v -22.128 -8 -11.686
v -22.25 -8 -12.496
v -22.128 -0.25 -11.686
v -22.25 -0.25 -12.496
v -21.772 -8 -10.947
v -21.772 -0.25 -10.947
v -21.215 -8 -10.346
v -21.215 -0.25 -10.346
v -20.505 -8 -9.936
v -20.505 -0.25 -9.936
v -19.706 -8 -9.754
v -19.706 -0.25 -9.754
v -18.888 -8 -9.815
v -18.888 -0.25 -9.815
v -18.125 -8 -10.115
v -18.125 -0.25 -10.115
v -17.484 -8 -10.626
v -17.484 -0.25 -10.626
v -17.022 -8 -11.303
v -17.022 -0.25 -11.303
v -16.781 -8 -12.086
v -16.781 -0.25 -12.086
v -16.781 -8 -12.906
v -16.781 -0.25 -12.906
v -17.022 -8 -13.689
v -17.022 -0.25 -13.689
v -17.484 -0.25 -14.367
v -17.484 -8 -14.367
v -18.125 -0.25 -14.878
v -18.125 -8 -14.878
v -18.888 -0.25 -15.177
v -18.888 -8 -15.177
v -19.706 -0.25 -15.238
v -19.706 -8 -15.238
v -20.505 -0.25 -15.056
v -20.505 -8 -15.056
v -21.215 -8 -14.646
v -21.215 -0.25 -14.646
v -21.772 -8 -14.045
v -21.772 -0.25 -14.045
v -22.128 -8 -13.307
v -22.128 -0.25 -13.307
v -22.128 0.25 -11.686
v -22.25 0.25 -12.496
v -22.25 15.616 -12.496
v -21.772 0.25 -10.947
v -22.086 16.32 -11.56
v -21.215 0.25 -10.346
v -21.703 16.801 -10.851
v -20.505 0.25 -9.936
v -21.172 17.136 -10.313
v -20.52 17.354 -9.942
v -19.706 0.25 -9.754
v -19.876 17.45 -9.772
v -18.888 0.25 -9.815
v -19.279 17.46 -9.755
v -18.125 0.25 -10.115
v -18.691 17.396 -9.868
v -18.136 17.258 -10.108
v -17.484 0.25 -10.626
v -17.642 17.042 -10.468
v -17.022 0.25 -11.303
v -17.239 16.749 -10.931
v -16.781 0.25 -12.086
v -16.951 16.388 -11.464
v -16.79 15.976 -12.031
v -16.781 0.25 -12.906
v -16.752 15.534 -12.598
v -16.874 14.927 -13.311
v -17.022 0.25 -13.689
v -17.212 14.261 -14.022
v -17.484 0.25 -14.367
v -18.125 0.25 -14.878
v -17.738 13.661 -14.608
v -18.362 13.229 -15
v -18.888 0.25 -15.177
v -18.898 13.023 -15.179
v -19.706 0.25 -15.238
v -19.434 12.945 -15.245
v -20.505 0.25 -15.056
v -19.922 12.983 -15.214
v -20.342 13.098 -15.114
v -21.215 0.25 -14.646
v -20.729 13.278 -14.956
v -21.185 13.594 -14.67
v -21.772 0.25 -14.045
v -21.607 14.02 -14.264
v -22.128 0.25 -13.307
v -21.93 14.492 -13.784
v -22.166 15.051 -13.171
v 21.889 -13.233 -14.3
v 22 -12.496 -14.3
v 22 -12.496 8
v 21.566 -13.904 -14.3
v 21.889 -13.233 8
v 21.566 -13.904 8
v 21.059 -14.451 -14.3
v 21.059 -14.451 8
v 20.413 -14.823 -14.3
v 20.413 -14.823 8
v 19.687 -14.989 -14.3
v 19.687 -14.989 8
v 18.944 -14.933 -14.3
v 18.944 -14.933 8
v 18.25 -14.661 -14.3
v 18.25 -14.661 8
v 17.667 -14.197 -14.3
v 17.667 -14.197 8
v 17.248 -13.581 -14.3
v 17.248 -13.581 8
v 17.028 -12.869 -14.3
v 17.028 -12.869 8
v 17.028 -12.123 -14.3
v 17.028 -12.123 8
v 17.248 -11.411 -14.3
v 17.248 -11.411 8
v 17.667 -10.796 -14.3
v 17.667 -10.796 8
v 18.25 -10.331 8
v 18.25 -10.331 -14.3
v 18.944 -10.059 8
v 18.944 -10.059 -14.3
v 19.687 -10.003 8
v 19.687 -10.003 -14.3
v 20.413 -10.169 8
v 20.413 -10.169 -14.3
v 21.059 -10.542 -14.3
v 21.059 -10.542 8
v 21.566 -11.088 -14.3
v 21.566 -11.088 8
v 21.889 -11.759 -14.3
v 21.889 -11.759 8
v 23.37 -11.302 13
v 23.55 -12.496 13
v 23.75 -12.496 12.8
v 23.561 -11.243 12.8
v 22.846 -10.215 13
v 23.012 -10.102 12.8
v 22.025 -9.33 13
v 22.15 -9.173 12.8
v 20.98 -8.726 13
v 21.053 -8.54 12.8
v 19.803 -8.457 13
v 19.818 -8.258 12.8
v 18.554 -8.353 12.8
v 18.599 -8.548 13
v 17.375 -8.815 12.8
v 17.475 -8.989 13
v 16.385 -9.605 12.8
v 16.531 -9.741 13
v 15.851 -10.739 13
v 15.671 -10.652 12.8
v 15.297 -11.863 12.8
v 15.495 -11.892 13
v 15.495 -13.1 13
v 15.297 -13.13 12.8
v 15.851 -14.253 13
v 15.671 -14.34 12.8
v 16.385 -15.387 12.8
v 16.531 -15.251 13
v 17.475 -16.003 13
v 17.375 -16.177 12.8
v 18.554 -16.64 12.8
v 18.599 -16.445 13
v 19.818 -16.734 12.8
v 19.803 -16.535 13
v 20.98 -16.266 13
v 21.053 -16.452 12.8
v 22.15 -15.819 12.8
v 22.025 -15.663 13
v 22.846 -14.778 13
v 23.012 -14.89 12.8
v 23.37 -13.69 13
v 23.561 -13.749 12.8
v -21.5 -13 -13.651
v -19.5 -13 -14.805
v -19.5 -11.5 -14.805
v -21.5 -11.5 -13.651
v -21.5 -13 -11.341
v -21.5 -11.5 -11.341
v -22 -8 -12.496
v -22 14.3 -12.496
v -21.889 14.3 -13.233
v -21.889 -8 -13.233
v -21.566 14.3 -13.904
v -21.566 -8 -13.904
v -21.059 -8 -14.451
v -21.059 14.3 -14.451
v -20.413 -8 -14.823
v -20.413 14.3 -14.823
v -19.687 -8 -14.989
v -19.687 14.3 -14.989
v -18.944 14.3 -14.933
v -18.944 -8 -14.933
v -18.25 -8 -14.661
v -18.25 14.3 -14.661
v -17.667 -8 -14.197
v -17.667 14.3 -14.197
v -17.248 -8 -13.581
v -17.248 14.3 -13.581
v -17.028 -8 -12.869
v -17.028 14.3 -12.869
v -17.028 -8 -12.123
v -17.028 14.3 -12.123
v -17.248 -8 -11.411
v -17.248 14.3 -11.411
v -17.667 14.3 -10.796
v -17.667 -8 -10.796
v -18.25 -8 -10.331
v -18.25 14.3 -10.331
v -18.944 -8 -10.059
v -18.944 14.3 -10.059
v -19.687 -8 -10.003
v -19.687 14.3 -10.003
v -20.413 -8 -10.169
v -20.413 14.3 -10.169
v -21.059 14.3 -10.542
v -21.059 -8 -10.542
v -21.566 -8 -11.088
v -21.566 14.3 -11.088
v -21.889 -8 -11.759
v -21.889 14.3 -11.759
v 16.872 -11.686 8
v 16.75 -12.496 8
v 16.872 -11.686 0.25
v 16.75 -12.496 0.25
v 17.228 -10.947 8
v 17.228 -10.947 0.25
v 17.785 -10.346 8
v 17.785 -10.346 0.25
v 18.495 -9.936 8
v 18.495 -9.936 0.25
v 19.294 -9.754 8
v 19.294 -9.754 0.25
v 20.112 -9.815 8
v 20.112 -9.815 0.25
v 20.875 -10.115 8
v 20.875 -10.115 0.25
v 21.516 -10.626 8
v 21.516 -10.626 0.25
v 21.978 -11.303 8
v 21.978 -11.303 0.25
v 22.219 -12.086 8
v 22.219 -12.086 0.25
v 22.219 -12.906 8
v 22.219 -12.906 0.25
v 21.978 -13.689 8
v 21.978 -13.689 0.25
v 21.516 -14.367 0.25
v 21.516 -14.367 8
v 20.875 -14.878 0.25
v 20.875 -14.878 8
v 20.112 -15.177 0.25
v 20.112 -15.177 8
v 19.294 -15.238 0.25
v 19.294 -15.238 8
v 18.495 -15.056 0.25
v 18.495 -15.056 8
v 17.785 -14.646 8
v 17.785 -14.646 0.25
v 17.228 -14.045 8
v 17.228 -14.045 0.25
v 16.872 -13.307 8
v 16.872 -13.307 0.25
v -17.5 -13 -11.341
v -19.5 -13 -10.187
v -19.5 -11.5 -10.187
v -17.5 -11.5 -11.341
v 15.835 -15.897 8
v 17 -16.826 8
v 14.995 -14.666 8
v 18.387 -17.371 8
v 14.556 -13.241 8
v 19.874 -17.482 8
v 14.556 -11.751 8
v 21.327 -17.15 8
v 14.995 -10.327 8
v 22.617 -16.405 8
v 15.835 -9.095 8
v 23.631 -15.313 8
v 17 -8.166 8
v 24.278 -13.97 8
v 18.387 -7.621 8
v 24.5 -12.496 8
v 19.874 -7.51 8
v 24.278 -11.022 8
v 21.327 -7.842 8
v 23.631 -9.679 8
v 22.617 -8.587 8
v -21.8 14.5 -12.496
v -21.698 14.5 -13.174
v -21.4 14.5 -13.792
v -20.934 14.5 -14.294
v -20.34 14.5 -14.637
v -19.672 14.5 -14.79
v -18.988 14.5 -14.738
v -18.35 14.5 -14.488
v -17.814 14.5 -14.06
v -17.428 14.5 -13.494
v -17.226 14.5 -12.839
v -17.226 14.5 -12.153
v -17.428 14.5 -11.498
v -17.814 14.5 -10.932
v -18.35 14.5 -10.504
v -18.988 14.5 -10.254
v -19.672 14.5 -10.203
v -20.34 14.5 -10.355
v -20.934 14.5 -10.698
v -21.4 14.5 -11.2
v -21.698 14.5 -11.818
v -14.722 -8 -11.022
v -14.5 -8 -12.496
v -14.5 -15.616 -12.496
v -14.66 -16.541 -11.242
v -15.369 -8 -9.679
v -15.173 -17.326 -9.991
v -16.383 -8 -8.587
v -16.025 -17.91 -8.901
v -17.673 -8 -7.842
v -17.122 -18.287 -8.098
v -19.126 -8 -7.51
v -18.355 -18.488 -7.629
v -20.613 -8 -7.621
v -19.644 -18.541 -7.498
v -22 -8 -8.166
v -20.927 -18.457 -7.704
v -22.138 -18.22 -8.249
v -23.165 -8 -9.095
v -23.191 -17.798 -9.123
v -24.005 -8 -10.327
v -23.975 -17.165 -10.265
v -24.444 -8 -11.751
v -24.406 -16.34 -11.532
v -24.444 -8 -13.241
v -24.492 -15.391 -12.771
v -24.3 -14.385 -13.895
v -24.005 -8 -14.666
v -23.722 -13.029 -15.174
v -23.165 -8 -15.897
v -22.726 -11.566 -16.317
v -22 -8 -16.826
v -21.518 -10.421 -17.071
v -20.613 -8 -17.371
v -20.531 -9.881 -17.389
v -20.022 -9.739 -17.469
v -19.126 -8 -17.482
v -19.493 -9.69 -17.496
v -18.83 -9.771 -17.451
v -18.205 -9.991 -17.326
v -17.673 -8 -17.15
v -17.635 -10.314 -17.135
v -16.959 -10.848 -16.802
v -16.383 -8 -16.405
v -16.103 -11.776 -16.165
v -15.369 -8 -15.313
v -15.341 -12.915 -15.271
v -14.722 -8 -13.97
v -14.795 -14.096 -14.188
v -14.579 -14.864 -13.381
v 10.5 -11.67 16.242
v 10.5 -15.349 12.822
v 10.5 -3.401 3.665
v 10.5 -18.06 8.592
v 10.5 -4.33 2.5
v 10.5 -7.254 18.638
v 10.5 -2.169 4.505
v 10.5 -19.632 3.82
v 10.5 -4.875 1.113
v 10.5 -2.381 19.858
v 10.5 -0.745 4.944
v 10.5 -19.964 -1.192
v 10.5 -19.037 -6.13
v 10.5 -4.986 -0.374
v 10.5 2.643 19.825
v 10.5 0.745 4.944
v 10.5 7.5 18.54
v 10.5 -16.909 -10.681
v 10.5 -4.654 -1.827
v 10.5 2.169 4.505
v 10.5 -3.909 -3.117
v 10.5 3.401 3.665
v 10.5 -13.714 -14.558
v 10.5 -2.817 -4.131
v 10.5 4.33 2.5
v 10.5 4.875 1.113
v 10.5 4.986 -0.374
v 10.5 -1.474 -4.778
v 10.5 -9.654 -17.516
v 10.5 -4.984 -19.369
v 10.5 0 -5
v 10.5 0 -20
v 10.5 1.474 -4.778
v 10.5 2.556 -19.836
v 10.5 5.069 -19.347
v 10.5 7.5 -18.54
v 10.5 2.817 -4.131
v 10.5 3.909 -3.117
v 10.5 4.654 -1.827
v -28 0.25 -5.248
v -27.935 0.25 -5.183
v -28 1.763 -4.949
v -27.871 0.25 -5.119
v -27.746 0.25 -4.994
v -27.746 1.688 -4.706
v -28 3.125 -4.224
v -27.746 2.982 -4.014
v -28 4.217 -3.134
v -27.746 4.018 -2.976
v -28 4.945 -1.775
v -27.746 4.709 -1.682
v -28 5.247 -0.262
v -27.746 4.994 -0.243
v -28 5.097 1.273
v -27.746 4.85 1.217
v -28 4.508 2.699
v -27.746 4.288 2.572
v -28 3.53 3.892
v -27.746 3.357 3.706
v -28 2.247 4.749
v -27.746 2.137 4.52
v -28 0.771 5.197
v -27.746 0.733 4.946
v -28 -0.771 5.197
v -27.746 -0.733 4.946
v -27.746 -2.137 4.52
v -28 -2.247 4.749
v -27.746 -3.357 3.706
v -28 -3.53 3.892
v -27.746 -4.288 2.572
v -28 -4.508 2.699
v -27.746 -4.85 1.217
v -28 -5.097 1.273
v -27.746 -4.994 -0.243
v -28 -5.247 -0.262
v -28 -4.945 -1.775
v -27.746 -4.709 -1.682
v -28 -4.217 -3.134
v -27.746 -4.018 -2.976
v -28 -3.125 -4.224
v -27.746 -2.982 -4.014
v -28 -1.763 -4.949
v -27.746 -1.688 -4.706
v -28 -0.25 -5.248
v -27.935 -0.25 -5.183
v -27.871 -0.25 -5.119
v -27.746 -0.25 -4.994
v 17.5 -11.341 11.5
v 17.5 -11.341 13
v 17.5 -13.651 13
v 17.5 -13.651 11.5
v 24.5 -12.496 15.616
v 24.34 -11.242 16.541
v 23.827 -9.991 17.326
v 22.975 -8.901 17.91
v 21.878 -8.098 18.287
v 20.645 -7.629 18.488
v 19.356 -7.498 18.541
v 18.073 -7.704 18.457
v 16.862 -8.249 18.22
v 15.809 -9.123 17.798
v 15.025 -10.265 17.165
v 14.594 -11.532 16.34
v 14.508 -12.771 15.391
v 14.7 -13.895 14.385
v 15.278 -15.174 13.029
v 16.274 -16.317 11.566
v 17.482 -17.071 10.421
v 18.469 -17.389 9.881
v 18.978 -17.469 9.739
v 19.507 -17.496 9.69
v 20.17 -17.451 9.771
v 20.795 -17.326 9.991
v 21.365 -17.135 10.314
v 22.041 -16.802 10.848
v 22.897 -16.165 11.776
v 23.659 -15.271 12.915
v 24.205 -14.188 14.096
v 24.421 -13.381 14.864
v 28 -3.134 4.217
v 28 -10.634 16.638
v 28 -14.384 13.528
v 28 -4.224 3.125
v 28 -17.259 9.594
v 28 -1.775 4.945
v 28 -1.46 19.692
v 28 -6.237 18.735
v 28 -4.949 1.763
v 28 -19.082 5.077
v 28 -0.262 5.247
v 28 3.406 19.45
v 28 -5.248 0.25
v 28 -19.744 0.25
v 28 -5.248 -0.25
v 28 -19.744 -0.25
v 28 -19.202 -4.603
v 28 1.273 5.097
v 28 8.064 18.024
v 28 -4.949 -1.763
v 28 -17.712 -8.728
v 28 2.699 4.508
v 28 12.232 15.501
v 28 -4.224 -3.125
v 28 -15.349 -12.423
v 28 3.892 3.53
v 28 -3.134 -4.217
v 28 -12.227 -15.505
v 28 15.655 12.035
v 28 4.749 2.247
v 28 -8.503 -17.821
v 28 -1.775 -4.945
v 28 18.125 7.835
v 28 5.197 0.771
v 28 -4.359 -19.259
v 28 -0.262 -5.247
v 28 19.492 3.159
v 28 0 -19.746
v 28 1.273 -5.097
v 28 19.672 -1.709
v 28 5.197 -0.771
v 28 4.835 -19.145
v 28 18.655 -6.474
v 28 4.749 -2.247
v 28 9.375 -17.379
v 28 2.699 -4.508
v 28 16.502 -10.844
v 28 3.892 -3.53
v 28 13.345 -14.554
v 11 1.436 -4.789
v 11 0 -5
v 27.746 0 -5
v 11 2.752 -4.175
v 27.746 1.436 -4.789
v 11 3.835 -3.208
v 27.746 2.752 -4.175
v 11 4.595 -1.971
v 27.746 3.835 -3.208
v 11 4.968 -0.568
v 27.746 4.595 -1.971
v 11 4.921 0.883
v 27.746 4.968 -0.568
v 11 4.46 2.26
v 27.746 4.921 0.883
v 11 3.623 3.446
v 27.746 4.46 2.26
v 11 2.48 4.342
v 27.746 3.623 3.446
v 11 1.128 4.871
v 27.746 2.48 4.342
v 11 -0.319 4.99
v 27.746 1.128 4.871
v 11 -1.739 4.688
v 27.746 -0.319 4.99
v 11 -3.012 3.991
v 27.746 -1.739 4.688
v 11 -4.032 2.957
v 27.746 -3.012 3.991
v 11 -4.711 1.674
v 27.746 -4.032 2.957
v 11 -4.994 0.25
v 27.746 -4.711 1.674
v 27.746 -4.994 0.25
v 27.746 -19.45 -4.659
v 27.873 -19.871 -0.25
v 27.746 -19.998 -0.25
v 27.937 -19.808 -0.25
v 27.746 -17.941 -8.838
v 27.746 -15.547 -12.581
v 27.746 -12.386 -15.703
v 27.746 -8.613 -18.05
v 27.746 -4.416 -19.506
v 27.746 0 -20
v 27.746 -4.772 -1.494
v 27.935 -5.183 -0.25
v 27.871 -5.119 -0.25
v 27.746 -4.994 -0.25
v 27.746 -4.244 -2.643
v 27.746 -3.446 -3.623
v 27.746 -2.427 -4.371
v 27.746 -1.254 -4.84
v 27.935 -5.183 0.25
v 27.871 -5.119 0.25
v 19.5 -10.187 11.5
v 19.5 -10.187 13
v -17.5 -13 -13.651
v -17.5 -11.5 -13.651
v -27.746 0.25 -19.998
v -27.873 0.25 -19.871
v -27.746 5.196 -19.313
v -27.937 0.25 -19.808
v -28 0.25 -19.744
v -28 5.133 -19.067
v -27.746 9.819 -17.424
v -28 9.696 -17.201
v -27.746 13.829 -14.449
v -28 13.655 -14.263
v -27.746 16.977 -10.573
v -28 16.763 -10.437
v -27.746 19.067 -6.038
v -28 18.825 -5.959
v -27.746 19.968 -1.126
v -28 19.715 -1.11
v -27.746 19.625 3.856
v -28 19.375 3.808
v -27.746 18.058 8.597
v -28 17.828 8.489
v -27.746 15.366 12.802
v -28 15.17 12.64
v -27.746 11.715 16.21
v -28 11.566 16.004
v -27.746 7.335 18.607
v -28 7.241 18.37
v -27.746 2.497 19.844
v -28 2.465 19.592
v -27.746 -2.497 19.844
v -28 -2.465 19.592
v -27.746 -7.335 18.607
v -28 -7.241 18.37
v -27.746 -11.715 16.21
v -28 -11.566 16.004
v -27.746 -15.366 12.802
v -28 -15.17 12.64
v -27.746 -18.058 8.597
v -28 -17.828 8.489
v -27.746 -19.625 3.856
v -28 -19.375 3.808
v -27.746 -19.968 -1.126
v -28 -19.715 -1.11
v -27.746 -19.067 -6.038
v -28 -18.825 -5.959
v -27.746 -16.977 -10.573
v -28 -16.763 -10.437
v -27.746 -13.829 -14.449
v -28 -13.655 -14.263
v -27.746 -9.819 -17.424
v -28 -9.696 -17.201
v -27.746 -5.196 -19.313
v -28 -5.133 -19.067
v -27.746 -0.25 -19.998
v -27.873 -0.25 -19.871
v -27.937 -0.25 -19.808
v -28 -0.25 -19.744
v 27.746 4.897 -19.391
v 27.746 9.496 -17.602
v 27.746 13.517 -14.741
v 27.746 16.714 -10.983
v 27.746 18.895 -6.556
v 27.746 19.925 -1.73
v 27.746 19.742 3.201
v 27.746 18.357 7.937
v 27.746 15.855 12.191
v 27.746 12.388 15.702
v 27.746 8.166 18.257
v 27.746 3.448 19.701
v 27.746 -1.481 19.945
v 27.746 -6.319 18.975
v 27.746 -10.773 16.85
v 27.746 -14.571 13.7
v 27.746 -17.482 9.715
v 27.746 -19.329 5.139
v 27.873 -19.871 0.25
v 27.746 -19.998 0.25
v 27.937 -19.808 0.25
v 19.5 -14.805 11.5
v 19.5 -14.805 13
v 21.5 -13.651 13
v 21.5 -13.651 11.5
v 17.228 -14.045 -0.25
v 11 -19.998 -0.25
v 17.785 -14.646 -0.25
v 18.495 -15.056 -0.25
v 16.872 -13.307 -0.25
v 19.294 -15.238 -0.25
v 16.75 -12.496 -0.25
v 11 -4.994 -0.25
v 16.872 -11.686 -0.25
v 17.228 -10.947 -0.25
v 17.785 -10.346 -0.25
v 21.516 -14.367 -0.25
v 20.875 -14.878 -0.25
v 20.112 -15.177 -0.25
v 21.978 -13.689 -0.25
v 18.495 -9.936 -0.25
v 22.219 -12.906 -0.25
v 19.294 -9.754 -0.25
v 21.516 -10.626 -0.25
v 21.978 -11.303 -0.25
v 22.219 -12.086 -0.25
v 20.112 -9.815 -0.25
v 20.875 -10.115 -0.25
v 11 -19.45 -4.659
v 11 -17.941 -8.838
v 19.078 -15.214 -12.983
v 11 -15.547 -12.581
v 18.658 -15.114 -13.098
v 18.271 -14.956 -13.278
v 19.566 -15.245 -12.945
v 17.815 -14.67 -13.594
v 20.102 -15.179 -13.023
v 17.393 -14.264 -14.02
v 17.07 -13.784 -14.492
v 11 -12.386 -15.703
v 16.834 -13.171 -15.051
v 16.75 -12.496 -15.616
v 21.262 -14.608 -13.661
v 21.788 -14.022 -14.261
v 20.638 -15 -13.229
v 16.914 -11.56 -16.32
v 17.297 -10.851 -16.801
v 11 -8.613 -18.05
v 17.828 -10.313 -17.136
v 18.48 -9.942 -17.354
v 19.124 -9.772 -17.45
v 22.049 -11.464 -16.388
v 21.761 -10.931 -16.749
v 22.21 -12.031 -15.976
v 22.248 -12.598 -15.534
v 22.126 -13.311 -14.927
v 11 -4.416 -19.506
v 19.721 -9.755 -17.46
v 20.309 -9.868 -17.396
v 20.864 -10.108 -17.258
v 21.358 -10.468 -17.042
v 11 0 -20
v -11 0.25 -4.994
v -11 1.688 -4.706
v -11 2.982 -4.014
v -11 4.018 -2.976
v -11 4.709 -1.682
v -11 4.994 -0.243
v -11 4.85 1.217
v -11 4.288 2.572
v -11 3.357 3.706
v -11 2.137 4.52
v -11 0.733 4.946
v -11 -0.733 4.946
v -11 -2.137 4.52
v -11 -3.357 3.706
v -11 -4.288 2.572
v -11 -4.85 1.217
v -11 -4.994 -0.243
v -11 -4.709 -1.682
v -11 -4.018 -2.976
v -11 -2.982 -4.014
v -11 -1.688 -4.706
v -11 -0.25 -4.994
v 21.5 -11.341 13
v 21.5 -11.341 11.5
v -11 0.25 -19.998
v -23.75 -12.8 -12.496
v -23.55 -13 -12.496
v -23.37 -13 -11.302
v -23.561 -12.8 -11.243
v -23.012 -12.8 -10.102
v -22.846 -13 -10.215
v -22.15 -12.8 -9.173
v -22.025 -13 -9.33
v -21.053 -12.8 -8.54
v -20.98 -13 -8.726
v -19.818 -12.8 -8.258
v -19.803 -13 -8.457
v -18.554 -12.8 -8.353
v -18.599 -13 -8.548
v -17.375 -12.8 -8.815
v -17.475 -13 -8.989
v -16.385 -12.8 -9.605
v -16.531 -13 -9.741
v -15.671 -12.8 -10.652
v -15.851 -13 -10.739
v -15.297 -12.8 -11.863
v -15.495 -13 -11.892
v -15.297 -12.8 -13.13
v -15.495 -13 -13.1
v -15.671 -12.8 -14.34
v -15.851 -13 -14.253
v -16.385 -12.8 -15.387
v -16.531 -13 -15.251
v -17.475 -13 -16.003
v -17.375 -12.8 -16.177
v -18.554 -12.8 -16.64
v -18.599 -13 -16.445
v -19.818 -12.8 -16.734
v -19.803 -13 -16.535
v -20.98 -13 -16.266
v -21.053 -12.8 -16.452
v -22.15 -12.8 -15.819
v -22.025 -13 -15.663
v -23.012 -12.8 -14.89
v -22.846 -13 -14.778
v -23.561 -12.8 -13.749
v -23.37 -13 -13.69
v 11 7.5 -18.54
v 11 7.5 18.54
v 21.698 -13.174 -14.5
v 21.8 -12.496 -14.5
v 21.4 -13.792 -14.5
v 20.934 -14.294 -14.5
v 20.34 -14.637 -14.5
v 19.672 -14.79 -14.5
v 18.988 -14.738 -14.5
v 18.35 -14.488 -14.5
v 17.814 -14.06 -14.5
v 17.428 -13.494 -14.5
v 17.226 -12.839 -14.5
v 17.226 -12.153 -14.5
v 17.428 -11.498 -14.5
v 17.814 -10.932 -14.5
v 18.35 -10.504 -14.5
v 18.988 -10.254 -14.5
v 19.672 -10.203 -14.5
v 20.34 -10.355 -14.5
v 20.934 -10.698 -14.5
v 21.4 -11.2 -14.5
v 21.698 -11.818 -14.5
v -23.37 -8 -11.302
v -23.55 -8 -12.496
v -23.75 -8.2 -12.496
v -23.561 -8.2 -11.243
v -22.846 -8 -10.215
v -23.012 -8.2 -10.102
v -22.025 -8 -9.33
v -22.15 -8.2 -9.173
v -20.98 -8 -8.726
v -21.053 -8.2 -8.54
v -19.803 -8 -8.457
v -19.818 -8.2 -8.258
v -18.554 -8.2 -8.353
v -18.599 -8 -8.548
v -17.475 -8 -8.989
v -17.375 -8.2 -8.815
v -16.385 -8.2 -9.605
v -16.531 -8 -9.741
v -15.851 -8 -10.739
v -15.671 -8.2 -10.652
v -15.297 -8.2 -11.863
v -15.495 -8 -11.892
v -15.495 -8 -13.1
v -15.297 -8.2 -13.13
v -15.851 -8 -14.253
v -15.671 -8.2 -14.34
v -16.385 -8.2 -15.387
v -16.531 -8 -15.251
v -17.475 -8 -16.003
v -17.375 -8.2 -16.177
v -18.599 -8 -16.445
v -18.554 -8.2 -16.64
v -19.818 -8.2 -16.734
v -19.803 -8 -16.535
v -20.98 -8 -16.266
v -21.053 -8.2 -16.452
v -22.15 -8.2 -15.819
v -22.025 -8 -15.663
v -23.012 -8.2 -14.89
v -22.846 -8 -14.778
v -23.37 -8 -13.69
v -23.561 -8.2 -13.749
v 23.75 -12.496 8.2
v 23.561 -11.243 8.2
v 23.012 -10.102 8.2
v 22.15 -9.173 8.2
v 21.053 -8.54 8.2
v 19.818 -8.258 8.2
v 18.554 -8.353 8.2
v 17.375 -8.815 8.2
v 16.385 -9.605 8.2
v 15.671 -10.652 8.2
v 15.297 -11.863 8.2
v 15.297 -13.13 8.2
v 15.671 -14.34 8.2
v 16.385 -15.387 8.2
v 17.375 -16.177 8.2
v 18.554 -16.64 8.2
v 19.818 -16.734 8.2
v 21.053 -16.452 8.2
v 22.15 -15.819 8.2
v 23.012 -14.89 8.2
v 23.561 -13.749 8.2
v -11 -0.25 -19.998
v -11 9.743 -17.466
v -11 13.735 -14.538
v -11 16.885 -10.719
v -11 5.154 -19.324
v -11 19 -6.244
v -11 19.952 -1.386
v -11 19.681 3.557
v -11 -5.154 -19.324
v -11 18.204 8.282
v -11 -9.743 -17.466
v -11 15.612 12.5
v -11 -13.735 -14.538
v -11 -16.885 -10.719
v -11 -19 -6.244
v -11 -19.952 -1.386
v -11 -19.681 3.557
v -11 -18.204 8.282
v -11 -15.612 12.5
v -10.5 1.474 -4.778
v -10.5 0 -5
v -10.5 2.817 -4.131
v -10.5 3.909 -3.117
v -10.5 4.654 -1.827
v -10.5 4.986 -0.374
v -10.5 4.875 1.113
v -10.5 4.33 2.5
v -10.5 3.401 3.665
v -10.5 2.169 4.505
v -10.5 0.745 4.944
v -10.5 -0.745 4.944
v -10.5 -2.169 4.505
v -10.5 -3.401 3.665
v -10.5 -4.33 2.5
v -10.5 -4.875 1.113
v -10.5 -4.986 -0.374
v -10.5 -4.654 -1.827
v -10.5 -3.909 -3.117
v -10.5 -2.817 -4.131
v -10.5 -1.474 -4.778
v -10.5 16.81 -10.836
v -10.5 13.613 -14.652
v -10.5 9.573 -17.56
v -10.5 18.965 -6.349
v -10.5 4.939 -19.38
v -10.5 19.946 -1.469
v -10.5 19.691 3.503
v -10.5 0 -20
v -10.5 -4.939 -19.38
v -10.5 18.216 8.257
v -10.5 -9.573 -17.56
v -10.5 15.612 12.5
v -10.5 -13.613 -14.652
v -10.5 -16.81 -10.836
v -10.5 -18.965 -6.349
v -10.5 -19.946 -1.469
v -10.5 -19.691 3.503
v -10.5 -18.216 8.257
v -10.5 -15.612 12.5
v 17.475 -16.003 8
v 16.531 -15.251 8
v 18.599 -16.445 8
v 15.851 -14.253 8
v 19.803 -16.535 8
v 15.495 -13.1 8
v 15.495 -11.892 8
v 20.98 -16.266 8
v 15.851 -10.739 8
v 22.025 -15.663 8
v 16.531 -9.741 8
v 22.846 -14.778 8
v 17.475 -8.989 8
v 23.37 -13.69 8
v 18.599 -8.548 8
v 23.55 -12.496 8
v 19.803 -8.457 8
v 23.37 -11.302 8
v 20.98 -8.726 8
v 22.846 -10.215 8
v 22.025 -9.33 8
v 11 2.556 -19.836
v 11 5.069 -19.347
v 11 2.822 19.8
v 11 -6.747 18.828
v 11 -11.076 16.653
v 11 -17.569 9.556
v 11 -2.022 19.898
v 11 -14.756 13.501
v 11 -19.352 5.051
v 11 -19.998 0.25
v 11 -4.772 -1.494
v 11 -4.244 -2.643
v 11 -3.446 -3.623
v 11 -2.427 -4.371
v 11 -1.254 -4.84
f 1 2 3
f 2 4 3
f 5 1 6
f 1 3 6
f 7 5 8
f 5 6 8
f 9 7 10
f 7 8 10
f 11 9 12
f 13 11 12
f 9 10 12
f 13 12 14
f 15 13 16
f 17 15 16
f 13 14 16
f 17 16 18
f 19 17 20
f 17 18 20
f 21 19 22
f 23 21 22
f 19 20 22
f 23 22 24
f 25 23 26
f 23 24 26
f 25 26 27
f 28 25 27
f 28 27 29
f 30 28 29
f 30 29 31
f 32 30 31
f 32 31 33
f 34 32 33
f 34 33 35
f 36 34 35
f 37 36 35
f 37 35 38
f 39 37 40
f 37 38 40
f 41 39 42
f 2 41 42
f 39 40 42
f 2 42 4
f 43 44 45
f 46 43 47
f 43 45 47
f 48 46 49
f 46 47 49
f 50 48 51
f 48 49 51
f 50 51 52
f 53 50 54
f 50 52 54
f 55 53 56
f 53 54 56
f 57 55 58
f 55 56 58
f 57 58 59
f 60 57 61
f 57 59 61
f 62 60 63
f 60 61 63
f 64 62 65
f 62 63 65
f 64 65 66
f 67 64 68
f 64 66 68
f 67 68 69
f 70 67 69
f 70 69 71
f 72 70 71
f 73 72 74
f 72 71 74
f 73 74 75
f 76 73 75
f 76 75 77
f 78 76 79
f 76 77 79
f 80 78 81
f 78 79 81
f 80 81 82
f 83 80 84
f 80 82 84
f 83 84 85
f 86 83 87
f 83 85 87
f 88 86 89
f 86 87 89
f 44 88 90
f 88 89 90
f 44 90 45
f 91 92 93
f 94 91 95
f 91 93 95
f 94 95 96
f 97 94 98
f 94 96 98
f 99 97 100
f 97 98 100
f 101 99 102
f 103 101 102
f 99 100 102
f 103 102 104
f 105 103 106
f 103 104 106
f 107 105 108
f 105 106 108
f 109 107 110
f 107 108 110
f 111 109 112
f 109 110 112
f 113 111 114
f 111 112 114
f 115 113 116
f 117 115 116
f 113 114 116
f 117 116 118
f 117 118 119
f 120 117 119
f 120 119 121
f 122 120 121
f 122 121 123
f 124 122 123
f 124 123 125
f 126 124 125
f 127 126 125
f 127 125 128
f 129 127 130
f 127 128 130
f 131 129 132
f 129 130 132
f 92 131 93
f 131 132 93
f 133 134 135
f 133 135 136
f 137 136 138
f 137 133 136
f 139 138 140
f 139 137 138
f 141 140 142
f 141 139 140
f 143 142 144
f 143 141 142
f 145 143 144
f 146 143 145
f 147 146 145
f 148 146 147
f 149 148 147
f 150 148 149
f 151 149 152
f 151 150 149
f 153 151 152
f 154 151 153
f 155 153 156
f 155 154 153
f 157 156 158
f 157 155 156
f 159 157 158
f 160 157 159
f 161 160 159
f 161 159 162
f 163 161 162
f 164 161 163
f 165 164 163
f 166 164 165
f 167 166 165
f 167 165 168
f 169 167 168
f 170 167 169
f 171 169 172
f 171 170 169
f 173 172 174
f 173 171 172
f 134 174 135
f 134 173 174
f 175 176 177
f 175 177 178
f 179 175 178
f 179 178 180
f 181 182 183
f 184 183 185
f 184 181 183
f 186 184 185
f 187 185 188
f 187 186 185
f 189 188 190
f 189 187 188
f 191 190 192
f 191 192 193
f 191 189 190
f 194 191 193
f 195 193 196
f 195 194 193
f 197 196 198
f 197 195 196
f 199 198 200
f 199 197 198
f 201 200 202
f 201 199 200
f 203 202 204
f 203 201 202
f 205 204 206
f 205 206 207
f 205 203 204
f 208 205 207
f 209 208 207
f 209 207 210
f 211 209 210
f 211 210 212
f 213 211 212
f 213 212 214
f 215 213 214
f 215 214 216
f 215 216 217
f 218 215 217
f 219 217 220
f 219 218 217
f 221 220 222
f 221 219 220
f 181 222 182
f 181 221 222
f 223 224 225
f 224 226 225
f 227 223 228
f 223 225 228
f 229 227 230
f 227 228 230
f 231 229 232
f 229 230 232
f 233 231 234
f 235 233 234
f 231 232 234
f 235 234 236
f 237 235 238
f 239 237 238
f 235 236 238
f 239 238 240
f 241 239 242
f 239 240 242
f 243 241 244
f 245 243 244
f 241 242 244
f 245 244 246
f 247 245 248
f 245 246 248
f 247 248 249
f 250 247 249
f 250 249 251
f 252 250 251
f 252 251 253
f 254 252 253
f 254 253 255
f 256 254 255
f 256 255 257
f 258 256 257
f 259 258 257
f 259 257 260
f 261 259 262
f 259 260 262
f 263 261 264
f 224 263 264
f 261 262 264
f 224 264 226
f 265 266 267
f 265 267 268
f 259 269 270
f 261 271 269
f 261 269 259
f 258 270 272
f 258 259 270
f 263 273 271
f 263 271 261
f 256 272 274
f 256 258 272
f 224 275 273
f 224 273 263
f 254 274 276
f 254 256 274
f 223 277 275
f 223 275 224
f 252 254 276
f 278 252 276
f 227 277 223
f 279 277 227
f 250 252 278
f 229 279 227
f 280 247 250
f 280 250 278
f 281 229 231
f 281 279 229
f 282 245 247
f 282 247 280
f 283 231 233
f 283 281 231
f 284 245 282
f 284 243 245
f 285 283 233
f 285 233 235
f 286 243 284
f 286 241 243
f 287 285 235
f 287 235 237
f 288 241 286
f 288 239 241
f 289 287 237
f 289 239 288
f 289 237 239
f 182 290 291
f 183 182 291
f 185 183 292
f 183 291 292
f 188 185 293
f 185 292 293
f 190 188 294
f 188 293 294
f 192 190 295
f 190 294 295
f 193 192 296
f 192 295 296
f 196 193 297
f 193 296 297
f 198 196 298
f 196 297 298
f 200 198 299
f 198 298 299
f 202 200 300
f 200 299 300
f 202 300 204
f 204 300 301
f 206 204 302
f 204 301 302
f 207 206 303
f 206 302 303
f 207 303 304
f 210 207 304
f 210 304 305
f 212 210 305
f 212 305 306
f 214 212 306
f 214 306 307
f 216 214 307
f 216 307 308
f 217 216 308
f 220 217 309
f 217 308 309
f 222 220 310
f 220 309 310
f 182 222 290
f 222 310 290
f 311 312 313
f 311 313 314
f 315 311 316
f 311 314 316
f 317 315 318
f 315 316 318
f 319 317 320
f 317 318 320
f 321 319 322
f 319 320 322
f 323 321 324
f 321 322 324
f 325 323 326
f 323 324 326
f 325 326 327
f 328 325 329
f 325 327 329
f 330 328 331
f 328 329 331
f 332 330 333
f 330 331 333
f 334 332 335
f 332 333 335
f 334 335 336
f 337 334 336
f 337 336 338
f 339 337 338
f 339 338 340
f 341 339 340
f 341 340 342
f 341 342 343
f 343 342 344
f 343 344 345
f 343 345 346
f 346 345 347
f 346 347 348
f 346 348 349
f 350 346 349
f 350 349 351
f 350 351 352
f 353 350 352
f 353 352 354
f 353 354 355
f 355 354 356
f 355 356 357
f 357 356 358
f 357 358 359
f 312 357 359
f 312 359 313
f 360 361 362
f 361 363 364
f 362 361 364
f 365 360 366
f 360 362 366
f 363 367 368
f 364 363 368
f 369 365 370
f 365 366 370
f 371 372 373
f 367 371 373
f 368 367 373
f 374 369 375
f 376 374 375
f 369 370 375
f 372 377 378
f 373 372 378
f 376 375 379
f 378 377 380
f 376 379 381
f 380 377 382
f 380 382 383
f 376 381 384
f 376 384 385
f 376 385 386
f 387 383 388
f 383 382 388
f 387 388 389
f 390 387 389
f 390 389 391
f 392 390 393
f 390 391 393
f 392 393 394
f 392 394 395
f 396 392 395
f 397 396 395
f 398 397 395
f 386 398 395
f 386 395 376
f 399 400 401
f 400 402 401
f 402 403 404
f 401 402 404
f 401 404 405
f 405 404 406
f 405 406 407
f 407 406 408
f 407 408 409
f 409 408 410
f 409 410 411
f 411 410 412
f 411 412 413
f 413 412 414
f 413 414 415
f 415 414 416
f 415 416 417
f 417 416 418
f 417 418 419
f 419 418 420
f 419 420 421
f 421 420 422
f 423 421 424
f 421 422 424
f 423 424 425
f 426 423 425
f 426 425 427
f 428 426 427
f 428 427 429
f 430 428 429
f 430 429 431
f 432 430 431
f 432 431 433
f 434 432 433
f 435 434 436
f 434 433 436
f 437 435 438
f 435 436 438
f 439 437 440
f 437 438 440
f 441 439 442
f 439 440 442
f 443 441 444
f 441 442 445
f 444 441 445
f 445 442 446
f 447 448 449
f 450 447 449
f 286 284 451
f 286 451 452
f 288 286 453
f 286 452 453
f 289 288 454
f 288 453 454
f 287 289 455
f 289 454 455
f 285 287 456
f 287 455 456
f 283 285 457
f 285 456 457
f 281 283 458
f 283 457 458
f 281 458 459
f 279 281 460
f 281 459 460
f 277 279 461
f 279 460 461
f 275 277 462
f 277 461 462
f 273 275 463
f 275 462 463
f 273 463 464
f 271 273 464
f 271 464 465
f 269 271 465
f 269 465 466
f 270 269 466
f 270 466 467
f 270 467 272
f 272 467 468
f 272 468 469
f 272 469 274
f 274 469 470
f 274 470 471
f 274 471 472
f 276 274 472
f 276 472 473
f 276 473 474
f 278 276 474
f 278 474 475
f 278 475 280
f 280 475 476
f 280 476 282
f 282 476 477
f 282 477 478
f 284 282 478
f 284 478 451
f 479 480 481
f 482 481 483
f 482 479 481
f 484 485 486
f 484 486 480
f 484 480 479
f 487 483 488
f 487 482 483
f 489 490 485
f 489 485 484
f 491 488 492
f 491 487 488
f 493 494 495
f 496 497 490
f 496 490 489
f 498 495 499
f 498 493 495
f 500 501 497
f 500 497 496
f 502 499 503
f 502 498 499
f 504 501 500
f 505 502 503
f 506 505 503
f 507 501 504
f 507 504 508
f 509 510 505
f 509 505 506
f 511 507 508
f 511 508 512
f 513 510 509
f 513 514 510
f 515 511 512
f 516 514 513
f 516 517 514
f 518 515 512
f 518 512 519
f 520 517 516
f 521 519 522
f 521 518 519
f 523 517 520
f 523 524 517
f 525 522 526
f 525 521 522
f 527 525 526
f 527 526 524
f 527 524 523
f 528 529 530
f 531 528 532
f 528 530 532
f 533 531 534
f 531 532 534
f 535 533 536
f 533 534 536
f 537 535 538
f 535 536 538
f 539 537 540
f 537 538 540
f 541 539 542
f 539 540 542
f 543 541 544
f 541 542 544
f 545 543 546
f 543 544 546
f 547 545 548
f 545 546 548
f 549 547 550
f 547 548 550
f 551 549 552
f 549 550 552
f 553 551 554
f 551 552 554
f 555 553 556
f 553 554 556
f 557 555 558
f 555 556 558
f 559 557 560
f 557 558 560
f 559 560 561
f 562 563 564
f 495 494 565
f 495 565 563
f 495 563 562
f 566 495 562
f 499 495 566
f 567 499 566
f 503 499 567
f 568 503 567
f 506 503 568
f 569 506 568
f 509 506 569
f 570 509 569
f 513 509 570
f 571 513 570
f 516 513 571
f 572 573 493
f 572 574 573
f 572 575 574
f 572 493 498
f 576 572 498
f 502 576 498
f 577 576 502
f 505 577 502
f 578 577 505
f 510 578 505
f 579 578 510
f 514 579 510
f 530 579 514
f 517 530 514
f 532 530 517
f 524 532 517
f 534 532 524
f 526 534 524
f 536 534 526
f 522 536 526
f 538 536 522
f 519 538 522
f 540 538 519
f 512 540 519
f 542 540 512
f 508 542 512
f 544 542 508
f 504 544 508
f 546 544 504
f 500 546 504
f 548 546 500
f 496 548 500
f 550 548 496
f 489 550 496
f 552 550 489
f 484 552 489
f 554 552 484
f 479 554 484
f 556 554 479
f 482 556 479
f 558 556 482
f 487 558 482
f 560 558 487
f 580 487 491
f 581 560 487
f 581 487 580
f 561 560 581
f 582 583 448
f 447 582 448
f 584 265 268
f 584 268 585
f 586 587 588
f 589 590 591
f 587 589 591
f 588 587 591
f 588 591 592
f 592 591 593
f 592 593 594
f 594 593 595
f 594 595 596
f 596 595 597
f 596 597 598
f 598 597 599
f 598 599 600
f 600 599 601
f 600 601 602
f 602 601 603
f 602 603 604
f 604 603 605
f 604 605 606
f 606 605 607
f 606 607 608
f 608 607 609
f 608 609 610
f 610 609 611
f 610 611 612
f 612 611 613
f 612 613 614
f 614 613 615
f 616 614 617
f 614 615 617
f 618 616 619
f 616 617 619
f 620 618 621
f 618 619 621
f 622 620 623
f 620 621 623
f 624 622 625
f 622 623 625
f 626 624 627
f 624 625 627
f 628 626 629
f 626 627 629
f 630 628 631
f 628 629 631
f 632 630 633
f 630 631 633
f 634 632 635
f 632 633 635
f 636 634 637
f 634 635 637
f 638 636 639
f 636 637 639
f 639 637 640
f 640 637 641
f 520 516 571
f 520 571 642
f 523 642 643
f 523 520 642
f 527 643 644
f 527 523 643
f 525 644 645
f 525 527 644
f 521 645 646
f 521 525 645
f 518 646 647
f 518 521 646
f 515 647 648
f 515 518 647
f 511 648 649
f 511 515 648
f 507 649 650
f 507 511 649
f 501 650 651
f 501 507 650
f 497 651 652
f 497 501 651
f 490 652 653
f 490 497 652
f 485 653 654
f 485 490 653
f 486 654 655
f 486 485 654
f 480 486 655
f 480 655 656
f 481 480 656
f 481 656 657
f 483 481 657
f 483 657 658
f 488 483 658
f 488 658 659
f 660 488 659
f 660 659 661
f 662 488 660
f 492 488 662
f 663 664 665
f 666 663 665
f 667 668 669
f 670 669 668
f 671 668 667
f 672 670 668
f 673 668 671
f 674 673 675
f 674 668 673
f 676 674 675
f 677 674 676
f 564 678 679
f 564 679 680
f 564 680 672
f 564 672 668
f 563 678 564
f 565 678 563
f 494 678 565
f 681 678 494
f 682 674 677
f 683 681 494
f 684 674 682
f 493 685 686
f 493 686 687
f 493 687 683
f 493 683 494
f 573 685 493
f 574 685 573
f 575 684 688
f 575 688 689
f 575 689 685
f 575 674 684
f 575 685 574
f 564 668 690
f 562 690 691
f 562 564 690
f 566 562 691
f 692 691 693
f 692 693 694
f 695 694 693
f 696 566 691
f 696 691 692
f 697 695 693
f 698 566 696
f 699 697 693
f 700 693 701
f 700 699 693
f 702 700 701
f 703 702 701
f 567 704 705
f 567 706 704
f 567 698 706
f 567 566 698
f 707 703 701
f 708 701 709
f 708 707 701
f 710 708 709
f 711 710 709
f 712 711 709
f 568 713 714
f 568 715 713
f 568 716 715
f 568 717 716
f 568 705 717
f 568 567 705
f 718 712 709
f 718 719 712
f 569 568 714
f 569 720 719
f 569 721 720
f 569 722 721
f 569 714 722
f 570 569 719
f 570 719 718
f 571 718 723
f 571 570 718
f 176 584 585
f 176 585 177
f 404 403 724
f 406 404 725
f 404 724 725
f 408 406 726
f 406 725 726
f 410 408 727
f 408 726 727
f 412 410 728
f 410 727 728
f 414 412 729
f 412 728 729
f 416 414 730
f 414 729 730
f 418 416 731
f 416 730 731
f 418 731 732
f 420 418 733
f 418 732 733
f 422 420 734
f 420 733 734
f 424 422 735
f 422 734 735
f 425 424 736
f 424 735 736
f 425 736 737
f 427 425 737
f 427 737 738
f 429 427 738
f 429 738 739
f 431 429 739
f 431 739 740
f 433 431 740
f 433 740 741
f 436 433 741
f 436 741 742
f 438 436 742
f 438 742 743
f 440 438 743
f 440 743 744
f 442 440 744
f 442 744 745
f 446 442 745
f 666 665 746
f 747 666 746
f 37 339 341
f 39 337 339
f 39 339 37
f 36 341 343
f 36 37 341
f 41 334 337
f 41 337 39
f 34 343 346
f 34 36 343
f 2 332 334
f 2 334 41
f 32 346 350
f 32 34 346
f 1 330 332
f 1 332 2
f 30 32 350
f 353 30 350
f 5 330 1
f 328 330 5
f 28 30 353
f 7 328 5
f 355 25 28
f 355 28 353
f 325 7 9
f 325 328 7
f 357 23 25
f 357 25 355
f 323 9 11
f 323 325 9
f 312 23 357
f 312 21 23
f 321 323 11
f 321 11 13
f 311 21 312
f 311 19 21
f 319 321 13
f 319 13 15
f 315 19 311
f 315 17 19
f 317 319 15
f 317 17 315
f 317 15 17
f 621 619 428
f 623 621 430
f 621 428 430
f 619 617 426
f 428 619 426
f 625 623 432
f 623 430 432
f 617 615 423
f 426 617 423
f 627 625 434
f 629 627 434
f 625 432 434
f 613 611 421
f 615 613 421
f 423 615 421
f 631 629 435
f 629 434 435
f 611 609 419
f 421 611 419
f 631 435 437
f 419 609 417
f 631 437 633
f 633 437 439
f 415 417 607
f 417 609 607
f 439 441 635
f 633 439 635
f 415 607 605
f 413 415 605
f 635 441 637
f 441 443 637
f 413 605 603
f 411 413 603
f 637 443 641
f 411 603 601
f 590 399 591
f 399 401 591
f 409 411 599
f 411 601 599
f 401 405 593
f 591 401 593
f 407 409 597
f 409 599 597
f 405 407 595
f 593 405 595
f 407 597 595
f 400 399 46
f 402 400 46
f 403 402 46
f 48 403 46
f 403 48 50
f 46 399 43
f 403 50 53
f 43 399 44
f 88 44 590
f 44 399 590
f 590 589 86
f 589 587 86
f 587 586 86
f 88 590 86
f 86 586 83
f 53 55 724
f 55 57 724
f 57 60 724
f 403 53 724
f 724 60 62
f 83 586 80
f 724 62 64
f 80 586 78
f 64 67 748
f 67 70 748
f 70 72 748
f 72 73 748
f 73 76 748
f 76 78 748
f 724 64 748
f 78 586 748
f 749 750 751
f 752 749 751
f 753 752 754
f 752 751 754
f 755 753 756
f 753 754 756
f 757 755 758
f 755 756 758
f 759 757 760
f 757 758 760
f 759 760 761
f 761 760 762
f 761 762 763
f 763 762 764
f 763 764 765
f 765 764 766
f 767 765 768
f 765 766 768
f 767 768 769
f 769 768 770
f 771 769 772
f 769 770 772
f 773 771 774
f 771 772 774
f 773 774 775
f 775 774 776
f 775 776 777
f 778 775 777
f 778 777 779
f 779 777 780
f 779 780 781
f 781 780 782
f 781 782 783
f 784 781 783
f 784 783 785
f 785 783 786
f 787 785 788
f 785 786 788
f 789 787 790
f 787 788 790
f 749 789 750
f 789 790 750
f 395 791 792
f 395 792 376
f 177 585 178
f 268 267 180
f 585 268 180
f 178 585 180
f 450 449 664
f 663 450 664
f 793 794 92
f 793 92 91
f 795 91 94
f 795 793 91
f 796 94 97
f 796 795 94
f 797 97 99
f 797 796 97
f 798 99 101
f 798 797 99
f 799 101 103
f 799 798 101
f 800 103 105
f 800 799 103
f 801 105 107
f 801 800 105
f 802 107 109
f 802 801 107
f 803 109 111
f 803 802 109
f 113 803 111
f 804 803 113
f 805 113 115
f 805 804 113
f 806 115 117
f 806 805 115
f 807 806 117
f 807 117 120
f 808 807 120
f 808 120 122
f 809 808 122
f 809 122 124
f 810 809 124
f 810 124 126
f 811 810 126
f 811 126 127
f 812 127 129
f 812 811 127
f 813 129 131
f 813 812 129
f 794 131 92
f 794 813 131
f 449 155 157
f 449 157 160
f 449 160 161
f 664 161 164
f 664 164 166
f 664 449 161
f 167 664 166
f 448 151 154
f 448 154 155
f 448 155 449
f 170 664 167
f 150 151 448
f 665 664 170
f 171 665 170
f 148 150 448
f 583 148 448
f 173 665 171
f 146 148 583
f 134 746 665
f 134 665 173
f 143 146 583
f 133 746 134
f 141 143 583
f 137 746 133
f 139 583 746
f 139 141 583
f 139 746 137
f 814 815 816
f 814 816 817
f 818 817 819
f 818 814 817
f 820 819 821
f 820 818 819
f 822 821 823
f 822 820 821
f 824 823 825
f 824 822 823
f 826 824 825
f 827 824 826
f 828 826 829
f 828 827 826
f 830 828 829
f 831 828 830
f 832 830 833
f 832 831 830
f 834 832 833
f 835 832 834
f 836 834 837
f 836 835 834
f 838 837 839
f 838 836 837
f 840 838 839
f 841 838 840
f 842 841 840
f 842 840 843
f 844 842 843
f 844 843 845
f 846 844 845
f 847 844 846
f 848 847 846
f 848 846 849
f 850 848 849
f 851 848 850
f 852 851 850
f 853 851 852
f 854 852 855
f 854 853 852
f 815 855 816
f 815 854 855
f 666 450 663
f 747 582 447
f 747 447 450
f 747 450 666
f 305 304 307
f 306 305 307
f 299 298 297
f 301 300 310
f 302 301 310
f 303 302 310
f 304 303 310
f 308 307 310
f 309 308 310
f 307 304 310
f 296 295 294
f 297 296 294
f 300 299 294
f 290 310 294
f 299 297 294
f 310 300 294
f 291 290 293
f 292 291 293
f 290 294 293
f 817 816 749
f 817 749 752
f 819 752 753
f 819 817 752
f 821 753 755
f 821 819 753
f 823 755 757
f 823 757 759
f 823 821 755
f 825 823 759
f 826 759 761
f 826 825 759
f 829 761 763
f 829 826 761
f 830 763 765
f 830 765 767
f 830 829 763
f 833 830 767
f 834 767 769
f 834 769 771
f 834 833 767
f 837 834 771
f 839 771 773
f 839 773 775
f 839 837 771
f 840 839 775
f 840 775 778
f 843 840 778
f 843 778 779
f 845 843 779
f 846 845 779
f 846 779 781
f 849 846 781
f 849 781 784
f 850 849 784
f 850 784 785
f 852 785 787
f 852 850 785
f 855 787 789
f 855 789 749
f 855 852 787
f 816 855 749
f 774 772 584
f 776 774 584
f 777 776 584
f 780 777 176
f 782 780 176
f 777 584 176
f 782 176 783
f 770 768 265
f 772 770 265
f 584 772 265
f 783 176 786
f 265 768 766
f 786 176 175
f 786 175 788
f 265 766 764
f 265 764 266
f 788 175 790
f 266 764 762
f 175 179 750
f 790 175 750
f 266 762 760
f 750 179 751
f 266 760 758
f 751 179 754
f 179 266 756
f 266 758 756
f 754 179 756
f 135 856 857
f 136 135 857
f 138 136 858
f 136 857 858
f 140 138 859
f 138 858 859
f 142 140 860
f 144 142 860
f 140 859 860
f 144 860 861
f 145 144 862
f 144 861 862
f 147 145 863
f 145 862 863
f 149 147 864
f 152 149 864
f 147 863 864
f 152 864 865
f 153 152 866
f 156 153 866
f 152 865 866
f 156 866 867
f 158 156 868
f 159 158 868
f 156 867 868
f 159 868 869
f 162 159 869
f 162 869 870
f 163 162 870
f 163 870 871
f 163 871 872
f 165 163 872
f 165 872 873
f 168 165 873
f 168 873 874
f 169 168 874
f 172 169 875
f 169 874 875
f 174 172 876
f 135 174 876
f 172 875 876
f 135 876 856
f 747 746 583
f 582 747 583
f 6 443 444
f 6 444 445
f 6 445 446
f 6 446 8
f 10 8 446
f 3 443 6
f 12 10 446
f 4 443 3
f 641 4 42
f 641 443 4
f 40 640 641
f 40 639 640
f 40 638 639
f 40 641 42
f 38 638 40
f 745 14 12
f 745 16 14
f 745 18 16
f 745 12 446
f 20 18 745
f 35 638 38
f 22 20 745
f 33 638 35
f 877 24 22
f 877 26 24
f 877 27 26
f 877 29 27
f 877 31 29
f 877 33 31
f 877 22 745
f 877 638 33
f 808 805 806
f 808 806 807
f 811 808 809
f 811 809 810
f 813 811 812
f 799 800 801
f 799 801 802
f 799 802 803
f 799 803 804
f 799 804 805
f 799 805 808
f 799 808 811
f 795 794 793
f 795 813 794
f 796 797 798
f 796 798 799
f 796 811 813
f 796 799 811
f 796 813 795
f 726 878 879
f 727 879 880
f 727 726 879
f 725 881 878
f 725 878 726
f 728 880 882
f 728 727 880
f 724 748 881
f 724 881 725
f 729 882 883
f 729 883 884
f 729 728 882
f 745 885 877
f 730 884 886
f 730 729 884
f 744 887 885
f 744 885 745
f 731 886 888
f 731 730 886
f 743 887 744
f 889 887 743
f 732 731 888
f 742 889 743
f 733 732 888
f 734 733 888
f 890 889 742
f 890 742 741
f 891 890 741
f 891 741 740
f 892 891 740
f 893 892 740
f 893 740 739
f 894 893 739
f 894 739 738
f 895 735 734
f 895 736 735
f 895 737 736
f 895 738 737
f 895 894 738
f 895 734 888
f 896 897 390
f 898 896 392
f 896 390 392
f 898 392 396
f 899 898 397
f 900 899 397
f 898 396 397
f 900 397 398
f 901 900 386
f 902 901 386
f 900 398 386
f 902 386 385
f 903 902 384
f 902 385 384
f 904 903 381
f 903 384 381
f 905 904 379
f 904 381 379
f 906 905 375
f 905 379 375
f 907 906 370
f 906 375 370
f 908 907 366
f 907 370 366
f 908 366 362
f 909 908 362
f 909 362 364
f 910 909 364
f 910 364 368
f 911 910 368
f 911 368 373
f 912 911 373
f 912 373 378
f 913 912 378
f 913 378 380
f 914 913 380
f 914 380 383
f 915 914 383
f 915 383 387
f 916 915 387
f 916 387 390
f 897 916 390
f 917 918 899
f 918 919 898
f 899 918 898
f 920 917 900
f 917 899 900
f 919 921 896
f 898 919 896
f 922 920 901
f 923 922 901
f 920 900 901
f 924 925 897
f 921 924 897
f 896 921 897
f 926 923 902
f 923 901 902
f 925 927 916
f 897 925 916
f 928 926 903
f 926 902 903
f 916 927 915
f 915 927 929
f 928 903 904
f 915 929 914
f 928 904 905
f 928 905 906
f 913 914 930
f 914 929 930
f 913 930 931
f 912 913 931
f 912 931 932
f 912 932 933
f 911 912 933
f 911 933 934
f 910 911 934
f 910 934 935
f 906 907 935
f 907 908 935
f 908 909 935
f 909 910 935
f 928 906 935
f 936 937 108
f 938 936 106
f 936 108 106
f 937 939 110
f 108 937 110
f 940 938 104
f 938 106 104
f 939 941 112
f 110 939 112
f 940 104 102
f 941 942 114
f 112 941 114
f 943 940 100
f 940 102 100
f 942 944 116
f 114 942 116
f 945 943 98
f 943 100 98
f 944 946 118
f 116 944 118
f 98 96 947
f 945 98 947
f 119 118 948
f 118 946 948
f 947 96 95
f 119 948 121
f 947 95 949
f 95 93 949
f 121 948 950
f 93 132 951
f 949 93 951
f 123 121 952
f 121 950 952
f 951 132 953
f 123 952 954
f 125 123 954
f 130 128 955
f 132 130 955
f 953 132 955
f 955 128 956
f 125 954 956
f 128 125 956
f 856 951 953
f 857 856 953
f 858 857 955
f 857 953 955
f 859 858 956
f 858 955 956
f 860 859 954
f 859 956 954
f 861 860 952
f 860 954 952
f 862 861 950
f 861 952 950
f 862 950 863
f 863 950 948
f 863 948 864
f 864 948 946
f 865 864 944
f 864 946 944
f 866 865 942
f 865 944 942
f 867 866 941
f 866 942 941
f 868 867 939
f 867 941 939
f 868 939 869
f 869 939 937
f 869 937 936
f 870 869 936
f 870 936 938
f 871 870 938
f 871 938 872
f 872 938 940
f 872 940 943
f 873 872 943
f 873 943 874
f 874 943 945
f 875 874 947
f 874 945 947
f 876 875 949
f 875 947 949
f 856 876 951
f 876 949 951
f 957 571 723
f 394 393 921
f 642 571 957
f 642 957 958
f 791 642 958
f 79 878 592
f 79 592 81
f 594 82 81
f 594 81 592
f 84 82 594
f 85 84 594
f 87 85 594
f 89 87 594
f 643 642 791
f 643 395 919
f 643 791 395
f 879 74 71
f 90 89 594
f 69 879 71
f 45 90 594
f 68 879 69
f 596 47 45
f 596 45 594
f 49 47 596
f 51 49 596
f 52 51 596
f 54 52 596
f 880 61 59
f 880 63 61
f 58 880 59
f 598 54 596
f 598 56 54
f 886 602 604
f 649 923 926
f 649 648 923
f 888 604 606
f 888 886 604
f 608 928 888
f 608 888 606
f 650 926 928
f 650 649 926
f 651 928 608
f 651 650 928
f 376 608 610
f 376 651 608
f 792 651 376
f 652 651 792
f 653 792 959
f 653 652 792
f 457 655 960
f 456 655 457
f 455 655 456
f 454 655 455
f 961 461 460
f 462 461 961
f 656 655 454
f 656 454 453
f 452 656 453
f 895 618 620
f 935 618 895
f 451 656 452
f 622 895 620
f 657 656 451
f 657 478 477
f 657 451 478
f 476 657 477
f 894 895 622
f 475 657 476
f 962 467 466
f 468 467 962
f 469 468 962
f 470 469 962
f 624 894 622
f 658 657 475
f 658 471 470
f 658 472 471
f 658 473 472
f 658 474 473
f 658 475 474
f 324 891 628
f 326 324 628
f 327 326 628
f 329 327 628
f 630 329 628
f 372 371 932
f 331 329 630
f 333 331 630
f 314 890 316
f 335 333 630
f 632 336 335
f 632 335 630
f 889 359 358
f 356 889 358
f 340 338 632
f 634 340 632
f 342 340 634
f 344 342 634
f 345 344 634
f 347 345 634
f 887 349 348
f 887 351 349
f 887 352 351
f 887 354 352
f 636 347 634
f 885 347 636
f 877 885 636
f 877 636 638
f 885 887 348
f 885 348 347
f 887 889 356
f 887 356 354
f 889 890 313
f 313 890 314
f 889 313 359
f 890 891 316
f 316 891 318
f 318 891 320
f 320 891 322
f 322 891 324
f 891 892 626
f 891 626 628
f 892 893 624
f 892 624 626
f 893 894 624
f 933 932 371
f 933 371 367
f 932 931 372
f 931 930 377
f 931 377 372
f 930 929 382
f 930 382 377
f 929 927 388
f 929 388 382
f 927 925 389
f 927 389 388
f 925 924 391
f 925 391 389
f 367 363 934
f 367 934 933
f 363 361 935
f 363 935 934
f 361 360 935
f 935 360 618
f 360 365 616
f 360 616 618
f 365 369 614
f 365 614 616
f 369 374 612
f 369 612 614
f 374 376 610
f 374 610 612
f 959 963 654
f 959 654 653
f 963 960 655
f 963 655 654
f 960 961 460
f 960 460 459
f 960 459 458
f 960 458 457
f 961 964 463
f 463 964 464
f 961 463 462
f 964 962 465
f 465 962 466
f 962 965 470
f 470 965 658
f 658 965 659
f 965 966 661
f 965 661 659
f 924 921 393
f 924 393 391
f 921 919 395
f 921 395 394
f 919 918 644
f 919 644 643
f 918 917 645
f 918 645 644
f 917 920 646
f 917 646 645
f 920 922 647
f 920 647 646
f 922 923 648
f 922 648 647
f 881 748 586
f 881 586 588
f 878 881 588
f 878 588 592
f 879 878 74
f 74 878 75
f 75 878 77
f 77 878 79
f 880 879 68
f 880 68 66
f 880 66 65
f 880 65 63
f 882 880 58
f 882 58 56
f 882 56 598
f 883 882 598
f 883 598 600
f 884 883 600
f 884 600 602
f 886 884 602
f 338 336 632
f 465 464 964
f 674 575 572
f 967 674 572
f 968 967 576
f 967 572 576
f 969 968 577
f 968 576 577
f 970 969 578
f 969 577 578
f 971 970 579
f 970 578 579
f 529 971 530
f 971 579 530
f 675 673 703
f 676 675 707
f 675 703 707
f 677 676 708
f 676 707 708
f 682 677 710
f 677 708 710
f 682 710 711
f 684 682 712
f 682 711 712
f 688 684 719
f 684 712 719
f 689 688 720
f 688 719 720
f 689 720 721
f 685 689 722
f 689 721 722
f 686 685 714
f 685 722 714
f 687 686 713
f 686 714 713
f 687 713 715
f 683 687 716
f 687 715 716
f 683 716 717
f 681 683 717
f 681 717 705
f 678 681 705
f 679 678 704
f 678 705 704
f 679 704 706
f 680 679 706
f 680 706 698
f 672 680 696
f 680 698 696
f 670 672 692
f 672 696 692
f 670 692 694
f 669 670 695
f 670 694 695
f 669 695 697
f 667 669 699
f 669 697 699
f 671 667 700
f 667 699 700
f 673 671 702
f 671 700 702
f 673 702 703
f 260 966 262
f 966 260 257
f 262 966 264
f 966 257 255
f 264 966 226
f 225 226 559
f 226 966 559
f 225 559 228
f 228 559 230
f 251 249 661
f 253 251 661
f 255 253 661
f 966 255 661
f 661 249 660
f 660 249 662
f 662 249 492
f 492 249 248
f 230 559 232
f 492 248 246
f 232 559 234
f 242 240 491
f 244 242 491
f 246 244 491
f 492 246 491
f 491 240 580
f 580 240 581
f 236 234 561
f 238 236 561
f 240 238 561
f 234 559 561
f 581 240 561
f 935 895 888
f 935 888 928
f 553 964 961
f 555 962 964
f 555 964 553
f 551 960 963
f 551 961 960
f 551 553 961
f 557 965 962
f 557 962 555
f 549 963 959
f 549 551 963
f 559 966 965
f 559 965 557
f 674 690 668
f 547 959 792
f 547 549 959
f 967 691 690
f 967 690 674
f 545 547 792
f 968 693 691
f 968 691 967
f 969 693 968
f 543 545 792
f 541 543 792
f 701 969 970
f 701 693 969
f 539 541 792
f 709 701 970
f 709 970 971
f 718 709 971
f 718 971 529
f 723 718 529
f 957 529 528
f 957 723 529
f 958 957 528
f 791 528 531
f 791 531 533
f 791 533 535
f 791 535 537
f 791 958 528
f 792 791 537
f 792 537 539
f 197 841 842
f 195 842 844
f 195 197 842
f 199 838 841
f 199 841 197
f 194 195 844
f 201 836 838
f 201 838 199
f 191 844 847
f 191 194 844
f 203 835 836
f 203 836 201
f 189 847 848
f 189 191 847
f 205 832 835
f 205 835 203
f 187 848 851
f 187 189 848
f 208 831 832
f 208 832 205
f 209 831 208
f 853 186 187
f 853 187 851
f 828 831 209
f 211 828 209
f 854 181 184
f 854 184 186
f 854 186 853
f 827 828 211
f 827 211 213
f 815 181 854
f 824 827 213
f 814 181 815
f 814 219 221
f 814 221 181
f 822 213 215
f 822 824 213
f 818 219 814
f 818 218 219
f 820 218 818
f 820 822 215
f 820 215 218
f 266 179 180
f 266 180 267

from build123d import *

# Parameters (mm, degrees)
SKETCH1_R                      = 20
BOSS_EXTRUDE1_DEPTH            = 28
SKETCH2_R                      = 5
CUT_EXTRUDE1_DEPTH             = 57
CHAMFER1_SIZE                  = 0.254
SKETCH4_W                      = 0.5
SKETCH4_H                      = 32.5
CUT_EXTRUDE2_DEPTH             = 41
SKETCH7_W                      = 0.5
SKETCH7_H                      = 27.5
CUT_EXTRUDE3_DEPTH             = 41
SKETCH8_W                      = 17
SKETCH8_H                      = 20
CUT_EXTRUDE5_DEPTH             = 0.25
SKETCH13_W                     = 17
SKETCH13_H                     = 20
CUT_EXTRUDE6_DEPTH             = 0.25
CBORE_FOR_M5_SHCS1_D           = 5.5
CBORE_FOR_M5_SHCS1_CBORE_D     = 10
CBORE_FOR_M5_SHCS1_CBORE_DEPTH = 12
CBORE_FOR_M5_SHCS2_D           = 5.5
CBORE_FOR_M5_SHCS2_CBORE_D     = 10
CBORE_FOR_M5_SHCS2_CBORE_DEPTH = 12
SKETCH16_R                     = 4.25
BOSS_EXTRUDE2_DEPTH            = 5
SKETCH17_R                     = 2.5
BOSS_EXTRUDE3_DEPTH            = 22.5
CHAMFER2_SIZE                  = 0.2
CUT_EXTRUDE7_DEPTH             = 1.5
CIRPATTERN1_COUNT              = 2
CIRPATTERN1_ANGLE              = 90


with BuildPart() as part:
    # Sketch1 → Boss-Extrude1 (new body, symmetric)
    with BuildSketch(Plane(origin=(0, 0, 0), x_dir=(0, 0, -1), z_dir=(1, 0, 0))):
        Circle(SKETCH1_R)
    extrude(amount=BOSS_EXTRUDE1_DEPTH, both=True)

    # Sketch2 → Cut-Extrude1 (cut, through all)
    with BuildSketch(Plane(origin=(28, 0, 0), x_dir=(0, 0, -1), z_dir=(1, 0, 0))):
        Circle(SKETCH2_R)
    extrude(amount=-CUT_EXTRUDE1_DEPTH, mode=Mode.SUBTRACT)

    # Chamfer1
    chamfer1_edges = [part.edges().sort_by_distance(p)[0] for p in [
        (-28, 0, 20),
        (28, 0, 20),
        (-28, 0, 5),
        (28, 0, 5),
    ]]
    chamfer(chamfer1_edges, length=CHAMFER1_SIZE)

    # Sketch4 → Cut-Extrude2 (cut, through all)
    with BuildSketch(Plane.XZ.offset(20)):
        with Locations((-10.75, -3.75)):
            Rectangle(SKETCH4_W, SKETCH4_H)
    extrude(amount=-CUT_EXTRUDE2_DEPTH, mode=Mode.SUBTRACT)

    # Sketch7 → Cut-Extrude3 (cut, through all)
    with BuildSketch(Plane(origin=(0, 0, -20), x_dir=(-1, 0, 0), z_dir=(0, 0, -1))):
        with Locations((-10.75, -6.25)):
            Rectangle(SKETCH7_W, SKETCH7_H)
    extrude(amount=-CUT_EXTRUDE3_DEPTH, mode=Mode.SUBTRACT)

    # Sketch8 → Cut-Extrude5 (cut, symmetric)
    with BuildSketch(Plane(origin=(0, 0, 0), x_dir=(1, 0, 0), z_dir=(0, 1, 0))):
        with Locations((-19.5, 10)):
            Rectangle(SKETCH8_W, SKETCH8_H)
    extrude(amount=CUT_EXTRUDE5_DEPTH, both=True, mode=Mode.SUBTRACT)

    # Sketch13 → Cut-Extrude6 (cut, symmetric)
    with BuildSketch(Plane.XY):
        with Locations((19.5, -10)):
            Rectangle(SKETCH13_W, SKETCH13_H)
    extrude(amount=CUT_EXTRUDE6_DEPTH, both=True, mode=Mode.SUBTRACT)

    # CBORE for M5 SHCS1 (through all)
    with Locations(Plane.XZ.offset(20)):
        with Locations((-19.5, -12.496091764)):
            CounterBoreHole(CBORE_FOR_M5_SHCS1_D / 2, CBORE_FOR_M5_SHCS1_CBORE_D / 2, CBORE_FOR_M5_SHCS1_CBORE_DEPTH)

    # CBORE for M5 SHCS2 (through all)
    with Locations(Plane.XY.offset(20)):
        with Locations((19.5, -12.496091764)):
            CounterBoreHole(CBORE_FOR_M5_SHCS2_D / 2, CBORE_FOR_M5_SHCS2_CBORE_D / 2, CBORE_FOR_M5_SHCS2_CBORE_DEPTH)


with BuildPart() as body_2:
    # Sketch16 → Boss-Extrude2 (new body)
    with BuildSketch(Plane.XY.offset(8)):
        with Locations((19.5, -12.496091764)):
            Circle(SKETCH16_R)
    extrude(amount=BOSS_EXTRUDE2_DEPTH)

    # Sketch17 → Boss-Extrude3 (add)
    with BuildSketch(Plane(origin=(0, 0, 8), x_dir=(-1, 0, 0), z_dir=(0, 0, -1))):
        with Locations(Location((-19.5, -12.496091764, 0), (0, 0, 180))):  # turned: the seam where the file's is
            Circle(SKETCH17_R)
    extrude(amount=BOSS_EXTRUDE3_DEPTH)

    # Chamfer2
    chamfer2_edges = [body_2.edges().sort_by_distance(p)[0] for p in [
        (15.25, -12.496091764, 8),
        (15.25, -12.496091764, 13),
        (17, -12.496091764, -14.5),
    ]]
    chamfer(chamfer2_edges, length=CHAMFER2_SIZE)

    # Sketch18 → Cut-Extrude7 (cut)
    with BuildSketch(Plane.XY.offset(13)):
        Polygon((19.5, -14.805492841), (21.5, -13.650792302), (21.5, -11.341391226), (19.5, -10.186690687), (17.5, -11.341391226), (17.5, -13.650792302), align=None)
    extrude(amount=-CUT_EXTRUDE7_DEPTH, mode=Mode.SUBTRACT)


with BuildPart() as body_3:
    # Mirror1: mirrored copy
    add(body_2.part.mirror(Plane(origin=(0, 0, 0), x_dir=(0, 0, 1), z_dir=(1, 0, 0))))


with BuildPart() as cirpattern1_1:
    # CirPattern1: pattern copy
    add(body_3.part.rotate(Axis((0, 0, 0), (1, 0, 0)), 1 * CIRPATTERN1_ANGLE / (CIRPATTERN1_COUNT - 1)))


solid = Compound([part.part, body_2.part, cirpattern1_1.part])
